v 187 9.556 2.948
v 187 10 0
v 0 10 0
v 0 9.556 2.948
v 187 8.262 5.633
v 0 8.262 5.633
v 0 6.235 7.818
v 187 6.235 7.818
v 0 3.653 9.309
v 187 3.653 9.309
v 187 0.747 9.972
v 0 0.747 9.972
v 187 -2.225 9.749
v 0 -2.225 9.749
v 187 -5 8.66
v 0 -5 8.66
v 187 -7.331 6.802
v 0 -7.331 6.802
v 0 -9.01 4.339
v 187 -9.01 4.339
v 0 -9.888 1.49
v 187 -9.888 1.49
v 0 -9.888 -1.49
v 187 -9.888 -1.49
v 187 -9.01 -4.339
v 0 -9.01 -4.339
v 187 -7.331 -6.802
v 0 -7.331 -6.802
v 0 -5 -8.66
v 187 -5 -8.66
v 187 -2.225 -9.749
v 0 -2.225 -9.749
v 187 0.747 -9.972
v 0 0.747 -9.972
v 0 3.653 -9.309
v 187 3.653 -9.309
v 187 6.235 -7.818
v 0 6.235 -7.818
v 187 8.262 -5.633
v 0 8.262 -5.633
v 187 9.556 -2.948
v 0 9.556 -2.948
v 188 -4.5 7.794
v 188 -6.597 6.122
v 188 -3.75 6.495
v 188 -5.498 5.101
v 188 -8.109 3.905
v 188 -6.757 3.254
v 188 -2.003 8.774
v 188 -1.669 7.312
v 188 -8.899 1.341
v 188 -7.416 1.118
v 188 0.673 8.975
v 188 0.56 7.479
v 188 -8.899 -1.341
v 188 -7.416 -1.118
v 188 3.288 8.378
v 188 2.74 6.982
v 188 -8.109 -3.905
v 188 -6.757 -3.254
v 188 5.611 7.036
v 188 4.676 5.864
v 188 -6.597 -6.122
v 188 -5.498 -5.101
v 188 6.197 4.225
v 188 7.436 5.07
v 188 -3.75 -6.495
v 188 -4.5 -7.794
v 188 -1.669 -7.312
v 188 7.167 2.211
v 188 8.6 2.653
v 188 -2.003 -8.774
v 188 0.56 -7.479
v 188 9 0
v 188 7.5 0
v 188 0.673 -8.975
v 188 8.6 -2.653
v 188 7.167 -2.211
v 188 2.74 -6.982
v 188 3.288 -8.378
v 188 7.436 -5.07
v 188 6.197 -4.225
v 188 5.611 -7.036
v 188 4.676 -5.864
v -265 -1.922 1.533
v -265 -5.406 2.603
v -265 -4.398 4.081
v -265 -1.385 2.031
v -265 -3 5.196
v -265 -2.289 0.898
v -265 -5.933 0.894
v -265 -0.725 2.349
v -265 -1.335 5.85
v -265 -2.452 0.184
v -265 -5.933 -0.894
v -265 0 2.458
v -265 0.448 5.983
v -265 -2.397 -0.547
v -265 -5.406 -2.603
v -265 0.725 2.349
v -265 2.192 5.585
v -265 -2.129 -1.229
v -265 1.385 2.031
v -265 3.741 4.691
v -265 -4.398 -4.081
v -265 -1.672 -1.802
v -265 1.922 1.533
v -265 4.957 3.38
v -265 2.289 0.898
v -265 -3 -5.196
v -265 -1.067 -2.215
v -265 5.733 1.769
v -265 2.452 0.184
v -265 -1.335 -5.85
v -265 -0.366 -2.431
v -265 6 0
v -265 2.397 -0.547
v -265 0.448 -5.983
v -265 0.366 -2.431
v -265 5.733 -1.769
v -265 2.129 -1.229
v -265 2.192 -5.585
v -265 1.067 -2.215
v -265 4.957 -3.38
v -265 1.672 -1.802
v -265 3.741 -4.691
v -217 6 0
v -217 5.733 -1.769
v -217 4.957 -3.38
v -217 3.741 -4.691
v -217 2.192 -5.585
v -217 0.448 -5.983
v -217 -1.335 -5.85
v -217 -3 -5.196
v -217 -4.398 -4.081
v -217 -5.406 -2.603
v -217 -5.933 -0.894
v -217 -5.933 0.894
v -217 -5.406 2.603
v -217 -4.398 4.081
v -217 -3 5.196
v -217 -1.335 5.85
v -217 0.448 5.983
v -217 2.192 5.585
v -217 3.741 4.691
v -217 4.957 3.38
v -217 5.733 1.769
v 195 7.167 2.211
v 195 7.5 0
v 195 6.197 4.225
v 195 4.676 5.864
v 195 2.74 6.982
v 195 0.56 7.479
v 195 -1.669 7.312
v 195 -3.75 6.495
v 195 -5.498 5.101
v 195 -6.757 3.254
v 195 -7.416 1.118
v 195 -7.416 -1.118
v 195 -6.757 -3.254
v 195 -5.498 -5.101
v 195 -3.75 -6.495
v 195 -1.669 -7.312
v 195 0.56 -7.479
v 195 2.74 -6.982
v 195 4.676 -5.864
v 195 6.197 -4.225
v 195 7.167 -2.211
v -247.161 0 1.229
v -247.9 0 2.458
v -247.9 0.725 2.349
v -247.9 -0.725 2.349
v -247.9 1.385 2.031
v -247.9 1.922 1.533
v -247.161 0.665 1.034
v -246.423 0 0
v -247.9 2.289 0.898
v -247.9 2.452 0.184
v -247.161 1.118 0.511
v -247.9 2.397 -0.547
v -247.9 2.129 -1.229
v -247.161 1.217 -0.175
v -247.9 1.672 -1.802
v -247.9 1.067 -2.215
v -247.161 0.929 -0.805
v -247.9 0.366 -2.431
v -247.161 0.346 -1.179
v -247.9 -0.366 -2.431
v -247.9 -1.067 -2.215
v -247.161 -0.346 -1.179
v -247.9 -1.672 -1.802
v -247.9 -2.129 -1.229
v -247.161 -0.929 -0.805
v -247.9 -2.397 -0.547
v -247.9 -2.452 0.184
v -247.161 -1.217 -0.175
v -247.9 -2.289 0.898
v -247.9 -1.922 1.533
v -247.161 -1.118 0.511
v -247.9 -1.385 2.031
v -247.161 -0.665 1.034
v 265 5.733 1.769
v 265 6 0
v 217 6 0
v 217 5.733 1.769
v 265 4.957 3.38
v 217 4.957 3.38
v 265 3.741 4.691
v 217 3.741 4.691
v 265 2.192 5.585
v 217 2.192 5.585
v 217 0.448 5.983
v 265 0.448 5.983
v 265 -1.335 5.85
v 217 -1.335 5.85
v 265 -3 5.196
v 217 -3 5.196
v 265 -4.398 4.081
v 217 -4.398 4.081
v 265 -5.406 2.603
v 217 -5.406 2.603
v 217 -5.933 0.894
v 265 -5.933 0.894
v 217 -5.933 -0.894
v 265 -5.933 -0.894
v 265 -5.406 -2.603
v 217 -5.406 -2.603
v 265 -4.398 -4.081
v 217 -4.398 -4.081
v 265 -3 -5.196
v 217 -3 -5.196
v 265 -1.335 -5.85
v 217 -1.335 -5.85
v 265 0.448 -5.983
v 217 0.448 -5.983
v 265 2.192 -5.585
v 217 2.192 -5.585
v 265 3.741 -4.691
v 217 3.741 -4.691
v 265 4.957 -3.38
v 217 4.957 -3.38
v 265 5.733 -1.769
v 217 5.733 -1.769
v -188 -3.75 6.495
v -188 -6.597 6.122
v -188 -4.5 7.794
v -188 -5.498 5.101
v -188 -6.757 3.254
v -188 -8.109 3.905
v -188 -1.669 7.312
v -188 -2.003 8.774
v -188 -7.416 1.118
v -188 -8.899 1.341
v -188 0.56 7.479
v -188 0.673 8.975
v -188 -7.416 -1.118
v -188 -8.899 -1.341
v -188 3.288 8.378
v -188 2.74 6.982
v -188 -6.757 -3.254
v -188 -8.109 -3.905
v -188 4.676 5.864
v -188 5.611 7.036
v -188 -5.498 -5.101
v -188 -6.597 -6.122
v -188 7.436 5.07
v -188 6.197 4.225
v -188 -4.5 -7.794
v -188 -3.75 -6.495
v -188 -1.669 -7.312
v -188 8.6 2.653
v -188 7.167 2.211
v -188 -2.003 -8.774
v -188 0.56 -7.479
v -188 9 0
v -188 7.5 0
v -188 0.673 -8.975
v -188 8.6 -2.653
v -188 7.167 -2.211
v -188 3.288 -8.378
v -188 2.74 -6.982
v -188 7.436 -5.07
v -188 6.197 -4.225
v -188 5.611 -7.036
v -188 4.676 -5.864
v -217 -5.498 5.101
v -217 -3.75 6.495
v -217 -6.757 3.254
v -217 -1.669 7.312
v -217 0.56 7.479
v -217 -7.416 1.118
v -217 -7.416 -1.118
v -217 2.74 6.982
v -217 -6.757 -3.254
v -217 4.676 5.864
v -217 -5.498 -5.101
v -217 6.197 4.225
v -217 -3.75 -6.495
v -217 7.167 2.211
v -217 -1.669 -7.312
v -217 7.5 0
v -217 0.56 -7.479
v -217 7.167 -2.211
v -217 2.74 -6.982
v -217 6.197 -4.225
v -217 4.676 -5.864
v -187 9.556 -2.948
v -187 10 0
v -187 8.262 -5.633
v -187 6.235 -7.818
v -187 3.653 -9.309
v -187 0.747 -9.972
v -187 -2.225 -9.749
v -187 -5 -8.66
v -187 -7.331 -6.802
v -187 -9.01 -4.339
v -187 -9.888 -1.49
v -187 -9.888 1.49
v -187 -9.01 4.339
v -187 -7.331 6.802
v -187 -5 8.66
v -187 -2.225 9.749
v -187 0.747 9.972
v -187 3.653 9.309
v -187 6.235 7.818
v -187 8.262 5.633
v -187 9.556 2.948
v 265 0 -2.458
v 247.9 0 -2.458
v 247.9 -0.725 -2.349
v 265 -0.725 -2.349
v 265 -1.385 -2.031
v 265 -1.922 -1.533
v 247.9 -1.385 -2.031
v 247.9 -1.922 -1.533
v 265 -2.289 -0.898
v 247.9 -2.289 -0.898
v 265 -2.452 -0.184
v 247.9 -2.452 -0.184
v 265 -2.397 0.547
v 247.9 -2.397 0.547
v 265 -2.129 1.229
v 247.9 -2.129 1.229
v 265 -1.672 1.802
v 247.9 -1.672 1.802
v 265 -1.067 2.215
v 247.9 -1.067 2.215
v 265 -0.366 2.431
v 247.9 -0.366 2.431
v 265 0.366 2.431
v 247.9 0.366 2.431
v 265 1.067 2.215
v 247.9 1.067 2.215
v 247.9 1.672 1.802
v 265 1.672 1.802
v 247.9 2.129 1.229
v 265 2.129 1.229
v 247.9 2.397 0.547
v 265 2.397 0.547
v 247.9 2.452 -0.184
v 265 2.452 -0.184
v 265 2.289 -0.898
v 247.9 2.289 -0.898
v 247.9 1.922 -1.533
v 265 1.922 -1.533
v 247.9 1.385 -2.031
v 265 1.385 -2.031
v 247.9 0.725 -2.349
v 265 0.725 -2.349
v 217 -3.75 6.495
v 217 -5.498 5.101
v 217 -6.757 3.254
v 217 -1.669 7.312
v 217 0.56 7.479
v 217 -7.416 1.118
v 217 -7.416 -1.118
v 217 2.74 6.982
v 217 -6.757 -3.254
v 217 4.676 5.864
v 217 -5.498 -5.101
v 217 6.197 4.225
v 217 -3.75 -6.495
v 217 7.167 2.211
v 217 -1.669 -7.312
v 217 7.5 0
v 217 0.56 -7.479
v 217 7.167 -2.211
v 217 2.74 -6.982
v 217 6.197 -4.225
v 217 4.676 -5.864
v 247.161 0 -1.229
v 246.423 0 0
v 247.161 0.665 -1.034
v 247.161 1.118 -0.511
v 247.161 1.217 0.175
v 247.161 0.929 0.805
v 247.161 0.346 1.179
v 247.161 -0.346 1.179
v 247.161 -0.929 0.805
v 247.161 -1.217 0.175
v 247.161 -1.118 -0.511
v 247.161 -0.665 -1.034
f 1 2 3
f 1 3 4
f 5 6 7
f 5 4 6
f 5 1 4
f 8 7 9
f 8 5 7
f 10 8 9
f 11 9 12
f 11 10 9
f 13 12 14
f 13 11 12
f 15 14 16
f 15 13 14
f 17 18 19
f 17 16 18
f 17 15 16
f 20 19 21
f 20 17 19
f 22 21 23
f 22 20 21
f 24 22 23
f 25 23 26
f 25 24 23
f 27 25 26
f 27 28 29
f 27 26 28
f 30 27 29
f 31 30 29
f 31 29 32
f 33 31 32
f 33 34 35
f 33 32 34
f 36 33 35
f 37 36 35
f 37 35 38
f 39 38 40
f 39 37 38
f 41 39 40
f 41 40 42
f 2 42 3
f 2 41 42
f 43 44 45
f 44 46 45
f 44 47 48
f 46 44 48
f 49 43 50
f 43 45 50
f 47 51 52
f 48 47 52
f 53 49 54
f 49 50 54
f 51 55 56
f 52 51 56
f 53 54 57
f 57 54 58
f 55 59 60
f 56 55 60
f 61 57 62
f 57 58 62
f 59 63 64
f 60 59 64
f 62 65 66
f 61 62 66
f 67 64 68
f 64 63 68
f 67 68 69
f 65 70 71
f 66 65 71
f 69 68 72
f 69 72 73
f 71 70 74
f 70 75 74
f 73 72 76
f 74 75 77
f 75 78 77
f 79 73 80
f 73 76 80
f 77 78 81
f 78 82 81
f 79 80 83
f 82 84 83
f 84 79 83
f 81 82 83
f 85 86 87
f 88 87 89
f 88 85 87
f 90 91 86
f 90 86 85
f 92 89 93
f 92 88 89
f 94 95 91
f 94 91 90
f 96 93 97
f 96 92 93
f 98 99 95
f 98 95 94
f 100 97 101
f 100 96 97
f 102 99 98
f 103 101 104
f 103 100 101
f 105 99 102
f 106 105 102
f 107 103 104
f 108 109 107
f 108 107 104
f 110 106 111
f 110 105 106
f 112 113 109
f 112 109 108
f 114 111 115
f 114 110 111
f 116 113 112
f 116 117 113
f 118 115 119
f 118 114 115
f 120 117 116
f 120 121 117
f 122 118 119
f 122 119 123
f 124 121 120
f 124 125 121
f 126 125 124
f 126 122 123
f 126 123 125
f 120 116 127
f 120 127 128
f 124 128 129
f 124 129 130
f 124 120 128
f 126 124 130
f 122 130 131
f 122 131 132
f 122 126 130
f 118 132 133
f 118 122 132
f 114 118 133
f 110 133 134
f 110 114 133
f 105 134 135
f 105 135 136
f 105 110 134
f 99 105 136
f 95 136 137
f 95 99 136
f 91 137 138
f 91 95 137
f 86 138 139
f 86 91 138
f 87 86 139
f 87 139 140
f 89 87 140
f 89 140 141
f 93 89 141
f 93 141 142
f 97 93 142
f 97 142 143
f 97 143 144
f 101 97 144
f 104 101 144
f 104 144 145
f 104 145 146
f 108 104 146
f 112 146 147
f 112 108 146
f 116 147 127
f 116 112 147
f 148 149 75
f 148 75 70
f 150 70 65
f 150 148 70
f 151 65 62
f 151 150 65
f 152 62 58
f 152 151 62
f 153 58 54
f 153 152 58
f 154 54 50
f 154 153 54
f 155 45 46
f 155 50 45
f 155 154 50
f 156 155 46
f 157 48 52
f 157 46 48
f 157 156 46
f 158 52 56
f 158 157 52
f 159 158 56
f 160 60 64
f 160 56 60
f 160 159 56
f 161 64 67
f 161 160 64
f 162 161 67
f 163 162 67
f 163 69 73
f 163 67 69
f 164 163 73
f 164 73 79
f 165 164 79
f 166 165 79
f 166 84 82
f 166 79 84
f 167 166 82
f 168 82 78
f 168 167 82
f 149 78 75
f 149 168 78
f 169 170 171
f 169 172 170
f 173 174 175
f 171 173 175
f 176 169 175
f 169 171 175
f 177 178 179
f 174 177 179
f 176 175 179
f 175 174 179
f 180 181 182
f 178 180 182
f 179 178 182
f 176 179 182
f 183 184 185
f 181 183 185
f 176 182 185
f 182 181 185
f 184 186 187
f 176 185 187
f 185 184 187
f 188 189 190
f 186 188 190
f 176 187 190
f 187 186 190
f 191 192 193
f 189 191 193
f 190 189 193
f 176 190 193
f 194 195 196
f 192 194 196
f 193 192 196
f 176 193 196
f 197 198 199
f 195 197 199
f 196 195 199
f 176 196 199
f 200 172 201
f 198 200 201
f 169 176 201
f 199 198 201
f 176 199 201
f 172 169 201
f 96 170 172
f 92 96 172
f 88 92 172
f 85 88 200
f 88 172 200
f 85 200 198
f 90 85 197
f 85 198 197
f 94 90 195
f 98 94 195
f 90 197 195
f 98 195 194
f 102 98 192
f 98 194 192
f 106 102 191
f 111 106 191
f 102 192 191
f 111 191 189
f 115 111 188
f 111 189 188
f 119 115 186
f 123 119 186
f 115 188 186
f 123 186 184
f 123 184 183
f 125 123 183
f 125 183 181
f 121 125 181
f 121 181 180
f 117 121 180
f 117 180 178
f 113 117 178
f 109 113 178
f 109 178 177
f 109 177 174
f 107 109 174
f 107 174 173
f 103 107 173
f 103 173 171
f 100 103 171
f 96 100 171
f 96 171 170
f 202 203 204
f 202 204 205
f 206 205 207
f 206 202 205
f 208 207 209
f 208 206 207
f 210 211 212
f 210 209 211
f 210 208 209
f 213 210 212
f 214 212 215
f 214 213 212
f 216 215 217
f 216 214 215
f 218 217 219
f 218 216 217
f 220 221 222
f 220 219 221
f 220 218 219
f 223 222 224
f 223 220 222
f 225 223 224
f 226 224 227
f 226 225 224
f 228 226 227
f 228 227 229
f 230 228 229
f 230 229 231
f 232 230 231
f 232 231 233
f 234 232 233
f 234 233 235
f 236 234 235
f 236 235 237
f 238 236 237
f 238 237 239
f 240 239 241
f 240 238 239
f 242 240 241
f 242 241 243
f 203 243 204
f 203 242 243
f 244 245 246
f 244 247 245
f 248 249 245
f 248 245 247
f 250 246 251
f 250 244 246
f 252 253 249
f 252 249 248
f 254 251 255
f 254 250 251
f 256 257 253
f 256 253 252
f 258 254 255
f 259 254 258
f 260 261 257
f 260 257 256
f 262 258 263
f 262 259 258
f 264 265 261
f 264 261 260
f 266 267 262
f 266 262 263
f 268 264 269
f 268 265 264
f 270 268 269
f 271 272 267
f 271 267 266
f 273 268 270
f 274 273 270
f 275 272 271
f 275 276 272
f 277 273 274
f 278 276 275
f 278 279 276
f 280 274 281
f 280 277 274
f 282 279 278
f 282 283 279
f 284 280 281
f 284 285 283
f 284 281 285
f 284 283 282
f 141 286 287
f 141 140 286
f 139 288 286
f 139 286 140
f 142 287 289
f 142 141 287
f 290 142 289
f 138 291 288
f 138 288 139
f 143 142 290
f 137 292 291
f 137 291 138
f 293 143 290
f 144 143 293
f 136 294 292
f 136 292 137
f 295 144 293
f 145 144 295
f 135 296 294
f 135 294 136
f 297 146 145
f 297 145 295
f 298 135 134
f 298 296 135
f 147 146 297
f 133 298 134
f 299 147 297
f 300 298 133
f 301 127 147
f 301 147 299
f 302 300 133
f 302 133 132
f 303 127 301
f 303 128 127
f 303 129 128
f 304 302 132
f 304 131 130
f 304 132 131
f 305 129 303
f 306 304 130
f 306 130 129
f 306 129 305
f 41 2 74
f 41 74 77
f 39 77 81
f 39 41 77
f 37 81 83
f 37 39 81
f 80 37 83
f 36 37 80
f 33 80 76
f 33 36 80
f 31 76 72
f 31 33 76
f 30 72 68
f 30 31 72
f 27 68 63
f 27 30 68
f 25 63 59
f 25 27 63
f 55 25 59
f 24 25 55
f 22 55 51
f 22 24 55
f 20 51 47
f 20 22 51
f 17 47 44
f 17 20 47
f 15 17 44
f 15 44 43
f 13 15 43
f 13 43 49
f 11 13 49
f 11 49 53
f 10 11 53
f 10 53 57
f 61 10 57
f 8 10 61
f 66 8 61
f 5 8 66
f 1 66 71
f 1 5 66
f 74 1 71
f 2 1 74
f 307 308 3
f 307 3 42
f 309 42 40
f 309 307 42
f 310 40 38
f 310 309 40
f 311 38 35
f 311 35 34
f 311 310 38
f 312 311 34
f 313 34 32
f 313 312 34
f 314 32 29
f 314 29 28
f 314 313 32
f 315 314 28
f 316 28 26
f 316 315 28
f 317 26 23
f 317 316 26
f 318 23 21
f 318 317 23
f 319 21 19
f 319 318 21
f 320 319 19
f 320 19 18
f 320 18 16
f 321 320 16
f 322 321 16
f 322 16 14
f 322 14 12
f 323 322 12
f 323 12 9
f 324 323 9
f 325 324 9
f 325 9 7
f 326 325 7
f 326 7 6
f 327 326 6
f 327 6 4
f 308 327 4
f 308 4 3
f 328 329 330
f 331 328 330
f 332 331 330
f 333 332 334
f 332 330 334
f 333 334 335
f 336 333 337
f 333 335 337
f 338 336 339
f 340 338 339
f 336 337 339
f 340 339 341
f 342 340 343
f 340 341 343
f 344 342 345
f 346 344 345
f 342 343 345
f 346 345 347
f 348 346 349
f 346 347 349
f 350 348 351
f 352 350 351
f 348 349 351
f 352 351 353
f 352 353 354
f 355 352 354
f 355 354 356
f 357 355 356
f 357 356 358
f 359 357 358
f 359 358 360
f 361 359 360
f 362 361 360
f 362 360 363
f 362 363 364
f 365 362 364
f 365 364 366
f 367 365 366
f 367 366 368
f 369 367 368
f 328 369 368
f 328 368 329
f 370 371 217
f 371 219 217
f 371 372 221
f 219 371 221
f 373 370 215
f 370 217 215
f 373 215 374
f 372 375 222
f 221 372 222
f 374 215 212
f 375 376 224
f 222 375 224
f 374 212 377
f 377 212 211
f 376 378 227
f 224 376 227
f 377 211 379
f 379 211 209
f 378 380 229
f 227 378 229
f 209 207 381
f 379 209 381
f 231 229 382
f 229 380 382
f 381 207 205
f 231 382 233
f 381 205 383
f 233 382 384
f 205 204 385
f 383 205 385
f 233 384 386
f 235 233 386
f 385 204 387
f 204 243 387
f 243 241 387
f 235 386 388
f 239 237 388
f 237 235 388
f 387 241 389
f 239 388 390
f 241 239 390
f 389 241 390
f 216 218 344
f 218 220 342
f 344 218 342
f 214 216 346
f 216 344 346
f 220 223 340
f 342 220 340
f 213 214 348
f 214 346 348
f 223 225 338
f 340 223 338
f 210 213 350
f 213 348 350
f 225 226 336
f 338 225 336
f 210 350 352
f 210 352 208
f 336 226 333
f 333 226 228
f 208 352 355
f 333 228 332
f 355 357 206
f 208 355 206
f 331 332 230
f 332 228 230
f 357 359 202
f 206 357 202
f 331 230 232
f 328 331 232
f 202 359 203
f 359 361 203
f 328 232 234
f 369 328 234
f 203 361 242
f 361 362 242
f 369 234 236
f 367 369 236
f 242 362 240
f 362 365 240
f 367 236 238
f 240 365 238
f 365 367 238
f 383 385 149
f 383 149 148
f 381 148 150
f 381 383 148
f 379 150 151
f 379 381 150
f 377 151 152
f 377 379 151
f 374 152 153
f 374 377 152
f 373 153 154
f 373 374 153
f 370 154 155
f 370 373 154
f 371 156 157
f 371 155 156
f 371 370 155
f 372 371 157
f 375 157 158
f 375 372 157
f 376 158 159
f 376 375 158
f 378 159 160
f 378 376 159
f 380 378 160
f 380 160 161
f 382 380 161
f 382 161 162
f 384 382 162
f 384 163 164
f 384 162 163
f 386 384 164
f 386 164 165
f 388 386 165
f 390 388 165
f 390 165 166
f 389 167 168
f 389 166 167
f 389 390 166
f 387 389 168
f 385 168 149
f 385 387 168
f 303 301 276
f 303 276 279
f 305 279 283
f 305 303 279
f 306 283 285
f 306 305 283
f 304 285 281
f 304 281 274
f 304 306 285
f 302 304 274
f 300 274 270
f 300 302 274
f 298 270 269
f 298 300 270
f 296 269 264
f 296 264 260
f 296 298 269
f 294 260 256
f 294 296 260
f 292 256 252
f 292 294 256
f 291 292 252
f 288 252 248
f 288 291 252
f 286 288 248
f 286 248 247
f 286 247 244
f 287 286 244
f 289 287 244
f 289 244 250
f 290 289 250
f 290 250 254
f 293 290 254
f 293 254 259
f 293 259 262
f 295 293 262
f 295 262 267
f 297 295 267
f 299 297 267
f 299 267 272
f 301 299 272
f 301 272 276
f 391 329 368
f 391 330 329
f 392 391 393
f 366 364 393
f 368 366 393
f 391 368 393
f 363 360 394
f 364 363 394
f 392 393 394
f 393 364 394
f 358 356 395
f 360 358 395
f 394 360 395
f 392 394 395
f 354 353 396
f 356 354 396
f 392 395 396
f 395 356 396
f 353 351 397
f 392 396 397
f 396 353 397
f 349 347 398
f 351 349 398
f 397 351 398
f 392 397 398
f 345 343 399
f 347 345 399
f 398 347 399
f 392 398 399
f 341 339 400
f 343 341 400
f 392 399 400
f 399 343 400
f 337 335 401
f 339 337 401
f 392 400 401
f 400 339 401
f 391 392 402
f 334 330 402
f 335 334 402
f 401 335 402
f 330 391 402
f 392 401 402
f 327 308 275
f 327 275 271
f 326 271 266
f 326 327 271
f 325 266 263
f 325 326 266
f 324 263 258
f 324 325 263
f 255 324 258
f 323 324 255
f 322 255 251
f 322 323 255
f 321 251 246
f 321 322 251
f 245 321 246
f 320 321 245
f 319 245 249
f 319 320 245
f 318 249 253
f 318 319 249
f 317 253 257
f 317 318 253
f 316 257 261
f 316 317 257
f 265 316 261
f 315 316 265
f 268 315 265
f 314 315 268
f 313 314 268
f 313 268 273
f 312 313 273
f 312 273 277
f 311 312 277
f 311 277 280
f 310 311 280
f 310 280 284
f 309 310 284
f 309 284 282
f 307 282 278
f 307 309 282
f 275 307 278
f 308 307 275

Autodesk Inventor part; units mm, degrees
ref_plane "YZ Plane" through (0, 0, 0) normal (1, 0, 0) x (0, 1, 0)
ref_plane "XZ Plane" through (0, 0, 0) normal (0, 1, 0) x (-1, 0, 0)
ref_plane "XY Plane" through (0, 0, 0) normal (0, 0, 1) x (1, 0, 0)
sketch "Sketch1" plane through (0, 0, 0) normal (0, 0, 1) x (1, 0, 0)
  line L0 (0, 0) -> (0, 10)
  line L1 (0, 10) -> (188, 10)
  line L2 (188, 10) -> (188, 7.5)
  line L3 (188, 7.5) -> (195, 7.5)
  line L4 (195, 7.5) -> (195, 7.5)
  line L5 (195, 7.5) -> (217, 7.5)
  line L6 (265, 0) -> (0, 0)
  line L7 (217, 7.5) -> (217, 6)
  line L8 (217, 6) -> (265, 6)
  line L9 (265, 6) -> (265, 0)
  line L10 (0, 10) -> (-188, 10)
  line L11 (-188, 10) -> (-188, 7.5)
  line L12 (-188, 7.5) -> (-195, 7.5)
  line L13 (-195, 7.5) -> (-195, 7.5)
  line L14 (-195, 7.5) -> (-217, 7.5)
  line L15 (-265, 0) -> (0, 0)
  line L16 (-217, 7.5) -> (-217, 6)
  line L17 (-217, 6) -> (-265, 6)
  line L18 (-265, 6) -> (-265, 0)
  point P0 (188, 8.75)
  point P1 (217, 6.75)
  point P2 (-188, 8.75)
  point P3 (-217, 6.75)
  dimension "d0" = 10
  dimension "d1" = 188
  dimension "d2" = 7
  dimension "d4" = 265
  dimension "d5" = 6
  dimension "d6" = 7.5
  dimension "d7" = 7.5
  dimension "d12" = 217
revolve "Revolution1" add sketch "Sketch1" angle 360 about axis through (265, 0, 0) along (-1, 0, 0)
chamfer "Chamfer1" distance 1 angle 45 2 edges at (188, -10, 0) (-188, -10, 0)
thread "Thread1" size "M15x1.5" class "6g" standard "ANSI Metric M Profile" length 8
thread "Thread2" size "M15x1.5" class "6g" standard "ANSI Metric M Profile" length 8
sketch "Sketch3" plane through (-265, 0, 0) normal (-1, 0, 0) x (0, 0, 1)
  point P0 (0, 0)
  point P1 (0, 0)
hole "Hole1" at (-265, 0, 0) direction (1, 0, 0) diameter 4.917 depth 17.1 tip angle 118 thread size "M6x1" class "6H" standard "ISO Metric profile"
sketch "Sketch4" plane through (265, 0, 0) normal (1, 0, 0) x (0, 0, -1)
  point P0 (0, 0)
  point P1 (0, 0)
hole "Hole2" at (265, 0, 0) direction (-1, 0, 0) diameter 4.917 depth 17.1 tip angle 118 thread size "M6x1" class "6H" standard "ISO Metric profile"
properties part number "P301" material "Steel, Mild"
